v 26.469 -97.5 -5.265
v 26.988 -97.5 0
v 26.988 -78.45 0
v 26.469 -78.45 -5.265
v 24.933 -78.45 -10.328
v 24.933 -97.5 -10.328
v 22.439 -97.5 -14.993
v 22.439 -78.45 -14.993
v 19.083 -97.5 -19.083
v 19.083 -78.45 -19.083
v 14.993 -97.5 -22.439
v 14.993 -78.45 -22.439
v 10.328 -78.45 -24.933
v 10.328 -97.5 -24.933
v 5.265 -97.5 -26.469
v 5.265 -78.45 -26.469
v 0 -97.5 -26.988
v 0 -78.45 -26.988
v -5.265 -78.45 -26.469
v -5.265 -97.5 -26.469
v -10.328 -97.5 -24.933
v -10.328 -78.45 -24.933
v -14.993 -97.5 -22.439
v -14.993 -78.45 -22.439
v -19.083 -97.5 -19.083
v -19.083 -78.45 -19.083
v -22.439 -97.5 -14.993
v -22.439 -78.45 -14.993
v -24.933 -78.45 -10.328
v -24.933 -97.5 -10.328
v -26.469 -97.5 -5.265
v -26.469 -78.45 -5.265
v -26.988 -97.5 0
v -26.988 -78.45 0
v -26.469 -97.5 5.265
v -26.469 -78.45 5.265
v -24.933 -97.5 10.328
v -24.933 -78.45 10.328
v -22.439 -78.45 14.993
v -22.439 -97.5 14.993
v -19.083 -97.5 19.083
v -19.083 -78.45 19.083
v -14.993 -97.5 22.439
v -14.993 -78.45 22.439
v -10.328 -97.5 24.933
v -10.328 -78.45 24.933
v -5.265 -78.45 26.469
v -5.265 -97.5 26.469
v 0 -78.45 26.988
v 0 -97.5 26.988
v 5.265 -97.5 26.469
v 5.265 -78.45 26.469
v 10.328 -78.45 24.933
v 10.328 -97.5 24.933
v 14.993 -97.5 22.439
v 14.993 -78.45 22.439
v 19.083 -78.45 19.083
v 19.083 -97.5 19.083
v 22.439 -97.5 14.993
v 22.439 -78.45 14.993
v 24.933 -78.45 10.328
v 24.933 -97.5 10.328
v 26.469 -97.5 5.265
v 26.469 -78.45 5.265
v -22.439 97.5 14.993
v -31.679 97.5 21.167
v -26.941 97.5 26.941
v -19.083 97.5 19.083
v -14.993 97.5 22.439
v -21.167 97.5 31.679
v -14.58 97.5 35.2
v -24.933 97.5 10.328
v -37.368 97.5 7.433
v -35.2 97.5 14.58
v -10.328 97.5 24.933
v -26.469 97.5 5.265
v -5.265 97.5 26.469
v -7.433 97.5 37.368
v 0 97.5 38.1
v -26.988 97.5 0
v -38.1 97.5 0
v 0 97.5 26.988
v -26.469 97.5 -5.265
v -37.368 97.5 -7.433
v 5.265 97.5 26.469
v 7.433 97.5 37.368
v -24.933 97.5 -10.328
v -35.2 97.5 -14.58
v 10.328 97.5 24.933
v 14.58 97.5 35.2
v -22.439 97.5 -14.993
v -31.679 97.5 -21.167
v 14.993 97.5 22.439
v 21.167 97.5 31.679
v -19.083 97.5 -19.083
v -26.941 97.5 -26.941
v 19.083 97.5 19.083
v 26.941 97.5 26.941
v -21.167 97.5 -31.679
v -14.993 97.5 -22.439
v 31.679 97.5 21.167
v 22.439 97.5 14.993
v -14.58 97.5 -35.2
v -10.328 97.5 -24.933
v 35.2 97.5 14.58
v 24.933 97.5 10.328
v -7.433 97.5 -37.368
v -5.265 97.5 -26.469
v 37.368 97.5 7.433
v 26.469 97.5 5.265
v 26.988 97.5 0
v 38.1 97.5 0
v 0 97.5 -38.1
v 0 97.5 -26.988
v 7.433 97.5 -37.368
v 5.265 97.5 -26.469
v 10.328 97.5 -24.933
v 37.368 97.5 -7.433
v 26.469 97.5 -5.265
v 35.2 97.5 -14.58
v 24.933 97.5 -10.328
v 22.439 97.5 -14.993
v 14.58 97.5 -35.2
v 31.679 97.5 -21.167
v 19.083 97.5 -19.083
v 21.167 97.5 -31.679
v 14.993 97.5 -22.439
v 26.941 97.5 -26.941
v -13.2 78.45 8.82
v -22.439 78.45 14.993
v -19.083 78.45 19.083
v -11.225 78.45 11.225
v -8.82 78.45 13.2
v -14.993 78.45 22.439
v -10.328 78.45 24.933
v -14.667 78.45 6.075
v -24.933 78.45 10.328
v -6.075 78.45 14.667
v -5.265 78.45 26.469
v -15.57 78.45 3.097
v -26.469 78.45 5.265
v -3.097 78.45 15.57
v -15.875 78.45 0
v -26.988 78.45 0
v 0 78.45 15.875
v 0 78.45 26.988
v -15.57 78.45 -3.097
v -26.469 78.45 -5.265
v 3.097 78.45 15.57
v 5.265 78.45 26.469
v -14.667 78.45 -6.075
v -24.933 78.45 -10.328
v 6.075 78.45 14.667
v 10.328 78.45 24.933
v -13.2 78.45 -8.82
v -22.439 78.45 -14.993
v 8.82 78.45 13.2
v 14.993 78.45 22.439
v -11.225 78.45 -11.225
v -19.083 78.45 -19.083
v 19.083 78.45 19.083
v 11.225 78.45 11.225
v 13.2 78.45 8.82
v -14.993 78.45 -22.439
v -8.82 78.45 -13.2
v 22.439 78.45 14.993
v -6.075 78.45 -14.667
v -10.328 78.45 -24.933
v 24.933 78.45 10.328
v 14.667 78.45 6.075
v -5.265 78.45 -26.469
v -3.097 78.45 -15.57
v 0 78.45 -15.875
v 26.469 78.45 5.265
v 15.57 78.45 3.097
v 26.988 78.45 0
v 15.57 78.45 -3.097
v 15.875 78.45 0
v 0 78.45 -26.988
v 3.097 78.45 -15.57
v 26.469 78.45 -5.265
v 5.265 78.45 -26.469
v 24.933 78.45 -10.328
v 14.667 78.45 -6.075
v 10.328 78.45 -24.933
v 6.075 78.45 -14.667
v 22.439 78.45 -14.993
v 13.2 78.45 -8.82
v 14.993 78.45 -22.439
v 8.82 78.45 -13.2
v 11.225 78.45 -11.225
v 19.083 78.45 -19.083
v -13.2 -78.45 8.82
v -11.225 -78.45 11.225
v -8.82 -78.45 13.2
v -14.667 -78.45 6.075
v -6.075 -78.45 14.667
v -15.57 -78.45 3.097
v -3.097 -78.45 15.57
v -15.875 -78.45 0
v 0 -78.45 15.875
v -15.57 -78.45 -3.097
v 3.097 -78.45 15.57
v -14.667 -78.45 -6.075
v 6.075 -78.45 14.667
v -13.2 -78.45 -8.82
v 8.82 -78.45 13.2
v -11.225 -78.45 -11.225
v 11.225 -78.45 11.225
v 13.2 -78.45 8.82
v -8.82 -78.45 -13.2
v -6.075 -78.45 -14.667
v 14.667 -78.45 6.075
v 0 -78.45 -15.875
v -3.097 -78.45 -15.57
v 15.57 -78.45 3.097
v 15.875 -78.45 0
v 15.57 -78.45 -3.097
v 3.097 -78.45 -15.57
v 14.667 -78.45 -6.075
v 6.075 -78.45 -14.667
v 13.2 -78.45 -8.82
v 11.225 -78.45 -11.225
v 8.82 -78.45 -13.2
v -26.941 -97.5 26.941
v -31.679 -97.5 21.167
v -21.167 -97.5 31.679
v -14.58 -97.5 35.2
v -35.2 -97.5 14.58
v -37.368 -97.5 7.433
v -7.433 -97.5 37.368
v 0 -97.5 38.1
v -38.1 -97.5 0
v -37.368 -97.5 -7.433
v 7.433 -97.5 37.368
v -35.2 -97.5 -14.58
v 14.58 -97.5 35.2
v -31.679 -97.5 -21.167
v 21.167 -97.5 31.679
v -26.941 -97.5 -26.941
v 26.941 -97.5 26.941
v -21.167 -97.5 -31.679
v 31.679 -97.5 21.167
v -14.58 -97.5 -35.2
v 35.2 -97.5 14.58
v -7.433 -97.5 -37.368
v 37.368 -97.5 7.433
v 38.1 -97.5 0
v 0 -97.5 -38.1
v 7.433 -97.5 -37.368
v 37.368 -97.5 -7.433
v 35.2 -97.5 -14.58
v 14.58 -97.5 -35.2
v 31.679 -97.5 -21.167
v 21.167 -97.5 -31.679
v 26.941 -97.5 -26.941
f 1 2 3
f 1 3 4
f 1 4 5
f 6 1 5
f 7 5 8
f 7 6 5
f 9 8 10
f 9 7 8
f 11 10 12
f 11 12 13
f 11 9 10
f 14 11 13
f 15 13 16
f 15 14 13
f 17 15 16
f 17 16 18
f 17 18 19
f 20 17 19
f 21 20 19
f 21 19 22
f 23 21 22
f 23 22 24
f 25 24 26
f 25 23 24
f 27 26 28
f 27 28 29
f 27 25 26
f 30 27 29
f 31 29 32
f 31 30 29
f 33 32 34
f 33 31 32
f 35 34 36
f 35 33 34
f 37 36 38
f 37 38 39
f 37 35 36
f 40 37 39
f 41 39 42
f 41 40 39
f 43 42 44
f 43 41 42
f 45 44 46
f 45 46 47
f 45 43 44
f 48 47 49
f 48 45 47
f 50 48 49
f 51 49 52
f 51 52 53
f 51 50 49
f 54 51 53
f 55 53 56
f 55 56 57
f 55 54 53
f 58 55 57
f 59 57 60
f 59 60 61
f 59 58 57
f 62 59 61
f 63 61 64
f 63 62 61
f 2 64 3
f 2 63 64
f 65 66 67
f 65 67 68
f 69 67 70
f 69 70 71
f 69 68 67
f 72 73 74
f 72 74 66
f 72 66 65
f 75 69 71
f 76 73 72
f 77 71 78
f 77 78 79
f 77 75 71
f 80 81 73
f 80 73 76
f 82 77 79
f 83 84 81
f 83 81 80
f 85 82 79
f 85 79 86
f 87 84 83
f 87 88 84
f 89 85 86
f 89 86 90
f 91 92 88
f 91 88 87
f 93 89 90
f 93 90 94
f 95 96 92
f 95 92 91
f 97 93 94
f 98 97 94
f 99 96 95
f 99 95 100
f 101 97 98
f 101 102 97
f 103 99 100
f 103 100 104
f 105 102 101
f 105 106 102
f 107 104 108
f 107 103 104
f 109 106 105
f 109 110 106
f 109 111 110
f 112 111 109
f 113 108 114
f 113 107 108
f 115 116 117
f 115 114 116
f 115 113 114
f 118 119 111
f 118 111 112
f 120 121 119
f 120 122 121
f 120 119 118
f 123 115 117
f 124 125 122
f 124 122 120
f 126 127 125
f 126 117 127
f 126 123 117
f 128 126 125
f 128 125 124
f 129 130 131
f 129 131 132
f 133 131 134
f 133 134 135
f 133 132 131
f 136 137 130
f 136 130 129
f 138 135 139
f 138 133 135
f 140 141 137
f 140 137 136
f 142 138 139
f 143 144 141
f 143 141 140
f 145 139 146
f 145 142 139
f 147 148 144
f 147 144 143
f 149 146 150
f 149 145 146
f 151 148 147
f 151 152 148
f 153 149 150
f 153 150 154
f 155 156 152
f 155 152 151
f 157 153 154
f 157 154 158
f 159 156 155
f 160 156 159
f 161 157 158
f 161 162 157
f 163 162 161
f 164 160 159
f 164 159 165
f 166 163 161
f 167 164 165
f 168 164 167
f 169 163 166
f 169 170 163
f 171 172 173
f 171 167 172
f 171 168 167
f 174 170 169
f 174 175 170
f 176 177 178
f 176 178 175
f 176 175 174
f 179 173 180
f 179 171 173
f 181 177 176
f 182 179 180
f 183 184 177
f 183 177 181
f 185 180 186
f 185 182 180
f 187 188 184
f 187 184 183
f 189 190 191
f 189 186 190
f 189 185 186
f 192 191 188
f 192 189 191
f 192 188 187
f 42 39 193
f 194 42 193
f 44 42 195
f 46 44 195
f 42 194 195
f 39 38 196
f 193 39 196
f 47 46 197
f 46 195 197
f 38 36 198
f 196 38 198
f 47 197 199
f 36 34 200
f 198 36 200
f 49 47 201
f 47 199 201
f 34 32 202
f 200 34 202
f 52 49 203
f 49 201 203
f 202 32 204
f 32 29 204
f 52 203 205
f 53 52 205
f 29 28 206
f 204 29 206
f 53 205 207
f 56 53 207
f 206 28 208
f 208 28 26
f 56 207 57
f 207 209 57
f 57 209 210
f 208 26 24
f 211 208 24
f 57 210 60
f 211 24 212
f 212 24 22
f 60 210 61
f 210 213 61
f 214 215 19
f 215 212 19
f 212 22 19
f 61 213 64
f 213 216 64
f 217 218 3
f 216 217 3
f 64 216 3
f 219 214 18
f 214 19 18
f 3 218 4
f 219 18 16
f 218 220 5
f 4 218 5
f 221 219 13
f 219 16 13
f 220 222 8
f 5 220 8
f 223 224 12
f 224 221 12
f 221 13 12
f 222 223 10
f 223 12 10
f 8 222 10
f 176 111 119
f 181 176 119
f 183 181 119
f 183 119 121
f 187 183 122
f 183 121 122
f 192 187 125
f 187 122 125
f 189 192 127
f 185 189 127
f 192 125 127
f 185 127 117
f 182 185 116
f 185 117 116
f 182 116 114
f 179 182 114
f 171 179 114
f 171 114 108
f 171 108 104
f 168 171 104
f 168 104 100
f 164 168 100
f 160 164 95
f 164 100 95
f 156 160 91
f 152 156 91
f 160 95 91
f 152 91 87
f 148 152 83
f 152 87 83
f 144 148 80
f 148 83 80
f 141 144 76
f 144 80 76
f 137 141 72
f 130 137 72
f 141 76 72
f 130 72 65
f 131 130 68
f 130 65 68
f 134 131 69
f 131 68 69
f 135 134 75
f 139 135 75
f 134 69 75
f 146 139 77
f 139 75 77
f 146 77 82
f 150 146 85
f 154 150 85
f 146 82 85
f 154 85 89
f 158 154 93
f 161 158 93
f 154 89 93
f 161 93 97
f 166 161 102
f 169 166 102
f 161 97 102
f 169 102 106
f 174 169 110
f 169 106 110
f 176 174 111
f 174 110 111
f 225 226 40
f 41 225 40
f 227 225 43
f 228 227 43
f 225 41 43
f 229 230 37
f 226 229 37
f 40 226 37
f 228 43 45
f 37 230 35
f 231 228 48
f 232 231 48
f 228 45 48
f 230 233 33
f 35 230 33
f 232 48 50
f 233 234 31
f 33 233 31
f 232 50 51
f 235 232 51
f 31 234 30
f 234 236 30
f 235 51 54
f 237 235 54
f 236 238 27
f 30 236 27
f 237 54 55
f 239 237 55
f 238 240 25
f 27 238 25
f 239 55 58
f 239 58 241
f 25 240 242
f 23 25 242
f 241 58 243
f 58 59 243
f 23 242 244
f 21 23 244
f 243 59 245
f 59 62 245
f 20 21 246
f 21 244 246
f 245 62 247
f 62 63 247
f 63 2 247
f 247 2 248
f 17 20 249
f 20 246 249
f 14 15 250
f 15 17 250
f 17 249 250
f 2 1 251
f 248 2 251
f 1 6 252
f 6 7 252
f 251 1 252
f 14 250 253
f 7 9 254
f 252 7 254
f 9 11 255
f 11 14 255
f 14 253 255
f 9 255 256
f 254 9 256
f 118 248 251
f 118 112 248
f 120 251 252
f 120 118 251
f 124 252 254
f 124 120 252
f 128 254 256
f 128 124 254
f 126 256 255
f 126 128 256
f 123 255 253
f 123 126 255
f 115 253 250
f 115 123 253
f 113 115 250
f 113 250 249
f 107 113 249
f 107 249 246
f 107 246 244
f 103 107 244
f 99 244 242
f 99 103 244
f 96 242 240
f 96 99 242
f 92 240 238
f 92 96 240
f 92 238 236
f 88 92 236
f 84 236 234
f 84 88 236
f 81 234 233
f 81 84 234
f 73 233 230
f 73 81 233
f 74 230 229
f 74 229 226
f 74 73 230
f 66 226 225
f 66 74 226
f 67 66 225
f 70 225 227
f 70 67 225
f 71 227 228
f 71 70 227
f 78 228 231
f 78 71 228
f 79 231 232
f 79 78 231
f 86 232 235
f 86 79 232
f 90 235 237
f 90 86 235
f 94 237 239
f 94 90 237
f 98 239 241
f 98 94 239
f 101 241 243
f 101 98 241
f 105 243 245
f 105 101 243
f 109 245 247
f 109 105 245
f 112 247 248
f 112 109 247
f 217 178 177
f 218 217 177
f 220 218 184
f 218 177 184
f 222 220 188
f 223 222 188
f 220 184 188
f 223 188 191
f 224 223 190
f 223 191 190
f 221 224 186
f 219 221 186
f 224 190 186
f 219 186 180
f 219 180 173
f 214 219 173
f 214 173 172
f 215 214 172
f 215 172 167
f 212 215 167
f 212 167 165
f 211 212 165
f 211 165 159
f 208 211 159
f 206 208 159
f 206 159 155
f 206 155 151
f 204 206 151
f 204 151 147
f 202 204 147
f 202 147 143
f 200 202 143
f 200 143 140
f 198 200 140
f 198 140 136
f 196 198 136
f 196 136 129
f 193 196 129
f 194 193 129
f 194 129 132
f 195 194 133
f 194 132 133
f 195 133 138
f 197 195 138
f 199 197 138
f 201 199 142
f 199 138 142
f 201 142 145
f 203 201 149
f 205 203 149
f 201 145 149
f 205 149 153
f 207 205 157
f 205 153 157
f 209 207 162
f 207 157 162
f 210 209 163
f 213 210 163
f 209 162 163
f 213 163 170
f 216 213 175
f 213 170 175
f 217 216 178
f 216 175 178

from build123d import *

# Parameters (mm, degrees)
BOSS_EXTRUDE1_DEPTH      = 97.5
BOSS_EXTRUDE1_DEPTH_BACK = 97.5
SKETCH1_R                = 38.1
SKETCH2_R                = 26.9875
CUT_EXTRUDE1_DEPTH       = 19.05
SKETCH3_R                = 15.875
CUT_EXTRUDE2_DEPTH       = 185.015277898


with BuildPart() as part:
    # Sketch1 → Boss-Extrude1 (new, two sides: drawn at the far end of the back side and taken through both)
    with BuildSketch(Plane(origin=(0, 0, 0), x_dir=(1, 0, 0), z_dir=(0, 1, 0)).offset(-BOSS_EXTRUDE1_DEPTH_BACK)):
        Circle(SKETCH1_R)
    extrude(amount=BOSS_EXTRUDE1_DEPTH + BOSS_EXTRUDE1_DEPTH_BACK)

    # Sketch2 → Cut-Extrude1 (cut)
    with BuildSketch(Plane(origin=(0, 97.5, 0), x_dir=(1, 0, 0), z_dir=(0, 1, 0))):
        Circle(SKETCH2_R)
    cut_extrude1 = extrude(amount=-CUT_EXTRUDE1_DEPTH, mode=Mode.SUBTRACT)

    # Mirror1: Cut-Extrude1 across plane
    add(cut_extrude1.mirror(Plane.ZX), mode=Mode.SUBTRACT)

    # Sketch3 → Cut-Extrude2 (cut, through all)
    with BuildSketch(Plane(origin=(0, 78.45, 0), x_dir=(1, 0, 0), z_dir=(0, 1, 0))):
        Circle(SKETCH3_R)
    extrude(amount=-CUT_EXTRUDE2_DEPTH, mode=Mode.SUBTRACT)


solid = part.part
